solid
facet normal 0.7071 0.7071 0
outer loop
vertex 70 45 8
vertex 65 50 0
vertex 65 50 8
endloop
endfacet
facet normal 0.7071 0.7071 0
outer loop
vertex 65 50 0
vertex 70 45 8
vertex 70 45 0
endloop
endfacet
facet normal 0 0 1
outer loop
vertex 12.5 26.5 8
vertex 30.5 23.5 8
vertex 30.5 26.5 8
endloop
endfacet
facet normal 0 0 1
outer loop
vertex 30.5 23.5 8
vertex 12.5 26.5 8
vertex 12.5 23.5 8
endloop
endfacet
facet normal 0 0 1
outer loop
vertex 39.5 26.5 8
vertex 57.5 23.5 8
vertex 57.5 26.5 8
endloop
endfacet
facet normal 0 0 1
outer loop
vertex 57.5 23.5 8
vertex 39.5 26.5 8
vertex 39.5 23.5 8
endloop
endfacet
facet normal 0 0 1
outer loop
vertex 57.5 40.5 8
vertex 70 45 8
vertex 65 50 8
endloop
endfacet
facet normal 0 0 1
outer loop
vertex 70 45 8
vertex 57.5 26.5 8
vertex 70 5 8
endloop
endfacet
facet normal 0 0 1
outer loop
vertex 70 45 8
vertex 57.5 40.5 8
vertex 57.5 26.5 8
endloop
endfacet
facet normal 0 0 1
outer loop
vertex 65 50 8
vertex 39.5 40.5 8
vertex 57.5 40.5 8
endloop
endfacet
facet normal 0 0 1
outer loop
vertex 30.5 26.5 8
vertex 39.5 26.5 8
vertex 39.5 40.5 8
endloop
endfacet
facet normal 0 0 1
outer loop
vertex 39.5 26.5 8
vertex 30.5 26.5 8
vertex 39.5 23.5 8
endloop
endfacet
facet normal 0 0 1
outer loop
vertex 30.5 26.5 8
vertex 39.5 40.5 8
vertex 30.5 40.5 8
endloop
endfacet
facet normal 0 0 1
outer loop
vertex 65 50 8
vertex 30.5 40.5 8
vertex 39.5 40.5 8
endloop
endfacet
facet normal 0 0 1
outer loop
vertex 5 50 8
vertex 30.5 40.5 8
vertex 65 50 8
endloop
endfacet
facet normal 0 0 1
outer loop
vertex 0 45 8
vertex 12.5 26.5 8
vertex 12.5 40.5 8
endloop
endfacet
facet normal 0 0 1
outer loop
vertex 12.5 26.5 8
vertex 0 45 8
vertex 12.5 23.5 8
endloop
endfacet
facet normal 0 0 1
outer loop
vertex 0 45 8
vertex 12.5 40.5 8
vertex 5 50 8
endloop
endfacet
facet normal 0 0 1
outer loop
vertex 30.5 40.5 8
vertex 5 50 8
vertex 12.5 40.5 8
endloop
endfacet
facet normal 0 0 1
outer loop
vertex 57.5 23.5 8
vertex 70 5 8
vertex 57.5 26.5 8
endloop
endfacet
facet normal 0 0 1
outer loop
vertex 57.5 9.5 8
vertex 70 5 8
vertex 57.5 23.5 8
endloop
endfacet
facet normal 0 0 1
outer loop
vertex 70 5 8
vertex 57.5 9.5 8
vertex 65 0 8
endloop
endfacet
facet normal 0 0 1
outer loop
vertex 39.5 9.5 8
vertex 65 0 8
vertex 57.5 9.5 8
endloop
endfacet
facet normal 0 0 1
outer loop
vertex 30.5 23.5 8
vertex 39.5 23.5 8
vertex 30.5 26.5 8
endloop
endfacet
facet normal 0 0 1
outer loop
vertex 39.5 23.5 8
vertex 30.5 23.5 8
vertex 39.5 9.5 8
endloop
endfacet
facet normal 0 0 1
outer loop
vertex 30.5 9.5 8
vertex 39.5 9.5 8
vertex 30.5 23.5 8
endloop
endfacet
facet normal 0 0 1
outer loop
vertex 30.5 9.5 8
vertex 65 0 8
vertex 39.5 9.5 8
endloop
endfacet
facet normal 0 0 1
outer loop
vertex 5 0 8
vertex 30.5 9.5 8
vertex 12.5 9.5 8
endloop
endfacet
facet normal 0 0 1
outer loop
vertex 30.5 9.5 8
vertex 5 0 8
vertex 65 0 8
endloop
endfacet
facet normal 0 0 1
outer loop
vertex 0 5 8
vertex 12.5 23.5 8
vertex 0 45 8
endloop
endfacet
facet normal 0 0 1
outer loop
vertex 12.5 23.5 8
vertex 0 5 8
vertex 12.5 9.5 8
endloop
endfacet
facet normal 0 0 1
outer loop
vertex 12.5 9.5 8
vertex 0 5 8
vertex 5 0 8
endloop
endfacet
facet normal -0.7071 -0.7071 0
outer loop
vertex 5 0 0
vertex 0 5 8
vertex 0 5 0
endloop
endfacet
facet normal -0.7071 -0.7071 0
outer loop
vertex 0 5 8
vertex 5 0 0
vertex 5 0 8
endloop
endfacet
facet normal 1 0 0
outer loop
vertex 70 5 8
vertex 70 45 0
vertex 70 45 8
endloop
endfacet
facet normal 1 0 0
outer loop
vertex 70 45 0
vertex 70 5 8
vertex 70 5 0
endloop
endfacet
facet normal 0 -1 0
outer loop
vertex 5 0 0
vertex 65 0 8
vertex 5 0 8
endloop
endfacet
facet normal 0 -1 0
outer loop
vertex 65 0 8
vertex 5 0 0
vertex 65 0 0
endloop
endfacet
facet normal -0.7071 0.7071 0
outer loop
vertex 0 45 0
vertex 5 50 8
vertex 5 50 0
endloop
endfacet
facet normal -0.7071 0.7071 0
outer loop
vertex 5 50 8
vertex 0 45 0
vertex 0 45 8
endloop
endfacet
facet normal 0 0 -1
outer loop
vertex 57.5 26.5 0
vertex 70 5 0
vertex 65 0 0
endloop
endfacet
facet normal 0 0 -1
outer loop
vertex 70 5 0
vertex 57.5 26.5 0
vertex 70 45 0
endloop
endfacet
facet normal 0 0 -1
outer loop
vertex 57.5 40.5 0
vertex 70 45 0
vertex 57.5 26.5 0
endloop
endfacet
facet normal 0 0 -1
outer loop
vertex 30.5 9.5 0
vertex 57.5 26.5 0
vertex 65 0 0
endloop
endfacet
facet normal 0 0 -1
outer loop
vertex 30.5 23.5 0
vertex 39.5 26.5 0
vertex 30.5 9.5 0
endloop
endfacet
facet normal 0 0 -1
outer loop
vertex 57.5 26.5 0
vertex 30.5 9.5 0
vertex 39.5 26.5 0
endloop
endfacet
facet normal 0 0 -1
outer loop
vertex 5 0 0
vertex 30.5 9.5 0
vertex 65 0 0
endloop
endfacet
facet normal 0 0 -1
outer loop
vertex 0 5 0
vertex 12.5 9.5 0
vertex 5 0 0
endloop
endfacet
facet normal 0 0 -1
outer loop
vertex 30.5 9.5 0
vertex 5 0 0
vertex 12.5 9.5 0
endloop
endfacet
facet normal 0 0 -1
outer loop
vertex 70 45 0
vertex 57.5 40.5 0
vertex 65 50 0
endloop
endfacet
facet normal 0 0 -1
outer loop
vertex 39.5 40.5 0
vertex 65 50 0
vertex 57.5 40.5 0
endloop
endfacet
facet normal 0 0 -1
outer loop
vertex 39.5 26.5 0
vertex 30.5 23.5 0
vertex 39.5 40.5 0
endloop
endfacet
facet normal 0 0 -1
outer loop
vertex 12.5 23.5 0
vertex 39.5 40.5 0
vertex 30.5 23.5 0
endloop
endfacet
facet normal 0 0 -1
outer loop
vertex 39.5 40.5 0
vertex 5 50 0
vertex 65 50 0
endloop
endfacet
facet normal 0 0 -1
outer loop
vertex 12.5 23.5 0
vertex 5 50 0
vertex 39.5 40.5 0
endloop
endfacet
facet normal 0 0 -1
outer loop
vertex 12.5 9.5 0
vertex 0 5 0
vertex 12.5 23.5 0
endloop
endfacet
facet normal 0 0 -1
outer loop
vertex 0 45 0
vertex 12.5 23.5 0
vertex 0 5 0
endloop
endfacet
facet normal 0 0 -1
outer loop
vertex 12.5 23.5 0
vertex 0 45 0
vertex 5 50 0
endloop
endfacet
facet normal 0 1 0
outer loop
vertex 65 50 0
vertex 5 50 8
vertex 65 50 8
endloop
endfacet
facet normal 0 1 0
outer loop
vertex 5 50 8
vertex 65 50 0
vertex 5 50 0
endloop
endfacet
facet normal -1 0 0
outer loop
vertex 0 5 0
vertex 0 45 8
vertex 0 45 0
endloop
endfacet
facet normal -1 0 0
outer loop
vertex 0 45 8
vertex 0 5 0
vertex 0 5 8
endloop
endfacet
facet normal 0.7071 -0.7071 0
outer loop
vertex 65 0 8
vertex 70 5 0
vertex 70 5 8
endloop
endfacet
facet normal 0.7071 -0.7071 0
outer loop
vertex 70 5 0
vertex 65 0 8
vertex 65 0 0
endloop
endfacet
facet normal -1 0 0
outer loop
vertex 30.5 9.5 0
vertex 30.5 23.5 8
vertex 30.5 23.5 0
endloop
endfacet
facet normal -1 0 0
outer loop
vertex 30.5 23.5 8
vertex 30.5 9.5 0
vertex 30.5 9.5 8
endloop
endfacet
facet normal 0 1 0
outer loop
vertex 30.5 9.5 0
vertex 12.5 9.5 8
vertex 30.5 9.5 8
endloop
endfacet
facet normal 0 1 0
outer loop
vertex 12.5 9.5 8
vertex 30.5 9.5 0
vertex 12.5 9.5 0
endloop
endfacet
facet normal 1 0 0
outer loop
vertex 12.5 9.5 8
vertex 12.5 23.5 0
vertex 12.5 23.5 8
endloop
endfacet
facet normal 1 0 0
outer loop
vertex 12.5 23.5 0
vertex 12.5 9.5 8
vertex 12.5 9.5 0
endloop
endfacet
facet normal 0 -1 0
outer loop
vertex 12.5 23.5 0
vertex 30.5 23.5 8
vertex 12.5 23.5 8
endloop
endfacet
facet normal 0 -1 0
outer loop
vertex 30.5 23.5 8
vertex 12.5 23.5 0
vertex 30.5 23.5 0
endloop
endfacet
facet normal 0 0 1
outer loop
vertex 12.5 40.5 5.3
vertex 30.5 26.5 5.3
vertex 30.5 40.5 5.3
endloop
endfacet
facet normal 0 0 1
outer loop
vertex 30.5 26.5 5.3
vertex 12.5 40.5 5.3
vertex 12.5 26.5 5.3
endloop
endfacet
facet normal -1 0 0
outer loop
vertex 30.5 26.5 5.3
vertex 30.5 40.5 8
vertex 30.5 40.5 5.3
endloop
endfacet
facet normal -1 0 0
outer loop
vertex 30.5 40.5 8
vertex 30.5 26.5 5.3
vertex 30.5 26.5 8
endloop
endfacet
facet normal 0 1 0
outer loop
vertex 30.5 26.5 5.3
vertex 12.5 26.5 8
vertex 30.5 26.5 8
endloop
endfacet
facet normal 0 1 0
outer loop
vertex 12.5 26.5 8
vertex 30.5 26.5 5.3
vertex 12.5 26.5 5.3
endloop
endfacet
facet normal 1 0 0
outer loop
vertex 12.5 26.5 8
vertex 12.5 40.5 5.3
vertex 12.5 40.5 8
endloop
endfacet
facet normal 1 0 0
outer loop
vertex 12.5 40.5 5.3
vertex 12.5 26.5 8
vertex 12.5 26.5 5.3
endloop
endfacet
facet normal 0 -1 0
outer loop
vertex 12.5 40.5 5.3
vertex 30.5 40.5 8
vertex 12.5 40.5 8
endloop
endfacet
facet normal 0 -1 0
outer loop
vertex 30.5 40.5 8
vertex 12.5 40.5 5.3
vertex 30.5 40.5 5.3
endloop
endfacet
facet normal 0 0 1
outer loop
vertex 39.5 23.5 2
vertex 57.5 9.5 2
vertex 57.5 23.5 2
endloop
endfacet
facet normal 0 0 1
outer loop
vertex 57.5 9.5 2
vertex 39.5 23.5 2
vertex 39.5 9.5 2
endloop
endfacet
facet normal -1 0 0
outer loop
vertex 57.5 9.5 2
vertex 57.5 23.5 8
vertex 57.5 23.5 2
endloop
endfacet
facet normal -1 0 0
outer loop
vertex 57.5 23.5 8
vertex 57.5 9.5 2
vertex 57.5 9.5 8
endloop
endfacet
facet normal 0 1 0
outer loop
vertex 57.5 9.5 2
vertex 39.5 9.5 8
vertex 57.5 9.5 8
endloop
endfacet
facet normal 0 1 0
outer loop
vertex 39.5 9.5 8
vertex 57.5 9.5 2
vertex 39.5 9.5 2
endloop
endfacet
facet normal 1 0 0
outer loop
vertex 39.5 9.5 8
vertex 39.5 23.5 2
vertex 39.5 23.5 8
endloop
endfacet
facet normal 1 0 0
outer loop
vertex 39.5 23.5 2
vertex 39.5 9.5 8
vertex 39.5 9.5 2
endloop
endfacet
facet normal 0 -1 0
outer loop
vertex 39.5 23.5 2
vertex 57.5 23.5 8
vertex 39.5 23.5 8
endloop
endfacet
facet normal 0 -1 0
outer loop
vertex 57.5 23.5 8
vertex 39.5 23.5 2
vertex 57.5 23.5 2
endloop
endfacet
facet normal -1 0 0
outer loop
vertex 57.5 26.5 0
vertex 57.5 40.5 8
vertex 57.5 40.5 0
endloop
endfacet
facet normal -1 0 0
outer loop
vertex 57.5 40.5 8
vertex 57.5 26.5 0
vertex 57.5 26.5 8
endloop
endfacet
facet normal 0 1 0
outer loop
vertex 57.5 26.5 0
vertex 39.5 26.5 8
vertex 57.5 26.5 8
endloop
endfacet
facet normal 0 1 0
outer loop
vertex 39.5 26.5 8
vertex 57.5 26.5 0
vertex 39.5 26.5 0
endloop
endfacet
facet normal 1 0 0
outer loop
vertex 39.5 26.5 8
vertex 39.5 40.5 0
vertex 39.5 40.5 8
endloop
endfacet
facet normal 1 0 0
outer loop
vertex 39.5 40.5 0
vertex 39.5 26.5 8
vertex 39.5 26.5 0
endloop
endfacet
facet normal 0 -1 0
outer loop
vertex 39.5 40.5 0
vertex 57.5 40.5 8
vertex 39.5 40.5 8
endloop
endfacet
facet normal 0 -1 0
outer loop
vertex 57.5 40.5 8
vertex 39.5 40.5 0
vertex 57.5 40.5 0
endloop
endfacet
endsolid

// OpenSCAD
$fn = 32;

// ----------------------------------------------------------------------
// Windowed plate: 4 voids, 70 x 50 x 8 mm
// ----------------------------------------------------------------------

// --- parameters (mm) ---
plate_l = 70;             // plate length, X
plate_w = 50;             // plate width, Y
plate_t = 8;              // plate thickness, Z
edge_margin = 8;          // wall from the plate edge to any window
win_l = 18;               // pocket length
win_w = 14;               // pocket width
pitch_x = 27;             // grid pitch along X
pitch_y = 17;             // grid pitch along Y
depth_1 = 8;              // depth of void 1 (full thickness = through)
depth_2 = 2.7;            // depth of void 2 (full thickness = through)
depth_3 = 6;              // depth of void 3 (full thickness = through)
depth_4 = 8;              // depth of void 4 (full thickness = through)
corner_c = 5;             // corner chamfer of the plate

profile = [[5, 0], [65, 0], [70, 5], [70, 45], [65, 50], [5, 50], [0, 45], [0, 5]];  // primary outline, 8 points, counter clockwise
void_1 = [[12.5, 9.5], [30.5, 9.5], [30.5, 23.5], [12.5, 23.5]];  // pocket at grid node 0,0, 4 points
void_2 = [[12.5, 26.5], [30.5, 26.5], [30.5, 40.5], [12.5, 40.5]];  // pocket at grid node 0,1, 4 points
void_3 = [[39.5, 9.5], [57.5, 9.5], [57.5, 23.5], [39.5, 23.5]];  // pocket at grid node 1,0, 4 points
void_4 = [[39.5, 26.5], [57.5, 26.5], [57.5, 40.5], [39.5, 40.5]];  // pocket at grid node 1,1, 4 points

// --- the one profile operation ---
difference() {
  linear_extrude(height = plate_t) polygon(points = profile);
  translate([0, 0, -1])
    linear_extrude(height = plate_t + 2) polygon(points = void_1);
  translate([0, 0, plate_t - depth_2])
    linear_extrude(height = depth_2 + 1) polygon(points = void_2);
  translate([0, 0, plate_t - depth_3])
    linear_extrude(height = depth_3 + 1) polygon(points = void_3);
  translate([0, 0, -1])
    linear_extrude(height = plate_t + 2) polygon(points = void_4);
}
